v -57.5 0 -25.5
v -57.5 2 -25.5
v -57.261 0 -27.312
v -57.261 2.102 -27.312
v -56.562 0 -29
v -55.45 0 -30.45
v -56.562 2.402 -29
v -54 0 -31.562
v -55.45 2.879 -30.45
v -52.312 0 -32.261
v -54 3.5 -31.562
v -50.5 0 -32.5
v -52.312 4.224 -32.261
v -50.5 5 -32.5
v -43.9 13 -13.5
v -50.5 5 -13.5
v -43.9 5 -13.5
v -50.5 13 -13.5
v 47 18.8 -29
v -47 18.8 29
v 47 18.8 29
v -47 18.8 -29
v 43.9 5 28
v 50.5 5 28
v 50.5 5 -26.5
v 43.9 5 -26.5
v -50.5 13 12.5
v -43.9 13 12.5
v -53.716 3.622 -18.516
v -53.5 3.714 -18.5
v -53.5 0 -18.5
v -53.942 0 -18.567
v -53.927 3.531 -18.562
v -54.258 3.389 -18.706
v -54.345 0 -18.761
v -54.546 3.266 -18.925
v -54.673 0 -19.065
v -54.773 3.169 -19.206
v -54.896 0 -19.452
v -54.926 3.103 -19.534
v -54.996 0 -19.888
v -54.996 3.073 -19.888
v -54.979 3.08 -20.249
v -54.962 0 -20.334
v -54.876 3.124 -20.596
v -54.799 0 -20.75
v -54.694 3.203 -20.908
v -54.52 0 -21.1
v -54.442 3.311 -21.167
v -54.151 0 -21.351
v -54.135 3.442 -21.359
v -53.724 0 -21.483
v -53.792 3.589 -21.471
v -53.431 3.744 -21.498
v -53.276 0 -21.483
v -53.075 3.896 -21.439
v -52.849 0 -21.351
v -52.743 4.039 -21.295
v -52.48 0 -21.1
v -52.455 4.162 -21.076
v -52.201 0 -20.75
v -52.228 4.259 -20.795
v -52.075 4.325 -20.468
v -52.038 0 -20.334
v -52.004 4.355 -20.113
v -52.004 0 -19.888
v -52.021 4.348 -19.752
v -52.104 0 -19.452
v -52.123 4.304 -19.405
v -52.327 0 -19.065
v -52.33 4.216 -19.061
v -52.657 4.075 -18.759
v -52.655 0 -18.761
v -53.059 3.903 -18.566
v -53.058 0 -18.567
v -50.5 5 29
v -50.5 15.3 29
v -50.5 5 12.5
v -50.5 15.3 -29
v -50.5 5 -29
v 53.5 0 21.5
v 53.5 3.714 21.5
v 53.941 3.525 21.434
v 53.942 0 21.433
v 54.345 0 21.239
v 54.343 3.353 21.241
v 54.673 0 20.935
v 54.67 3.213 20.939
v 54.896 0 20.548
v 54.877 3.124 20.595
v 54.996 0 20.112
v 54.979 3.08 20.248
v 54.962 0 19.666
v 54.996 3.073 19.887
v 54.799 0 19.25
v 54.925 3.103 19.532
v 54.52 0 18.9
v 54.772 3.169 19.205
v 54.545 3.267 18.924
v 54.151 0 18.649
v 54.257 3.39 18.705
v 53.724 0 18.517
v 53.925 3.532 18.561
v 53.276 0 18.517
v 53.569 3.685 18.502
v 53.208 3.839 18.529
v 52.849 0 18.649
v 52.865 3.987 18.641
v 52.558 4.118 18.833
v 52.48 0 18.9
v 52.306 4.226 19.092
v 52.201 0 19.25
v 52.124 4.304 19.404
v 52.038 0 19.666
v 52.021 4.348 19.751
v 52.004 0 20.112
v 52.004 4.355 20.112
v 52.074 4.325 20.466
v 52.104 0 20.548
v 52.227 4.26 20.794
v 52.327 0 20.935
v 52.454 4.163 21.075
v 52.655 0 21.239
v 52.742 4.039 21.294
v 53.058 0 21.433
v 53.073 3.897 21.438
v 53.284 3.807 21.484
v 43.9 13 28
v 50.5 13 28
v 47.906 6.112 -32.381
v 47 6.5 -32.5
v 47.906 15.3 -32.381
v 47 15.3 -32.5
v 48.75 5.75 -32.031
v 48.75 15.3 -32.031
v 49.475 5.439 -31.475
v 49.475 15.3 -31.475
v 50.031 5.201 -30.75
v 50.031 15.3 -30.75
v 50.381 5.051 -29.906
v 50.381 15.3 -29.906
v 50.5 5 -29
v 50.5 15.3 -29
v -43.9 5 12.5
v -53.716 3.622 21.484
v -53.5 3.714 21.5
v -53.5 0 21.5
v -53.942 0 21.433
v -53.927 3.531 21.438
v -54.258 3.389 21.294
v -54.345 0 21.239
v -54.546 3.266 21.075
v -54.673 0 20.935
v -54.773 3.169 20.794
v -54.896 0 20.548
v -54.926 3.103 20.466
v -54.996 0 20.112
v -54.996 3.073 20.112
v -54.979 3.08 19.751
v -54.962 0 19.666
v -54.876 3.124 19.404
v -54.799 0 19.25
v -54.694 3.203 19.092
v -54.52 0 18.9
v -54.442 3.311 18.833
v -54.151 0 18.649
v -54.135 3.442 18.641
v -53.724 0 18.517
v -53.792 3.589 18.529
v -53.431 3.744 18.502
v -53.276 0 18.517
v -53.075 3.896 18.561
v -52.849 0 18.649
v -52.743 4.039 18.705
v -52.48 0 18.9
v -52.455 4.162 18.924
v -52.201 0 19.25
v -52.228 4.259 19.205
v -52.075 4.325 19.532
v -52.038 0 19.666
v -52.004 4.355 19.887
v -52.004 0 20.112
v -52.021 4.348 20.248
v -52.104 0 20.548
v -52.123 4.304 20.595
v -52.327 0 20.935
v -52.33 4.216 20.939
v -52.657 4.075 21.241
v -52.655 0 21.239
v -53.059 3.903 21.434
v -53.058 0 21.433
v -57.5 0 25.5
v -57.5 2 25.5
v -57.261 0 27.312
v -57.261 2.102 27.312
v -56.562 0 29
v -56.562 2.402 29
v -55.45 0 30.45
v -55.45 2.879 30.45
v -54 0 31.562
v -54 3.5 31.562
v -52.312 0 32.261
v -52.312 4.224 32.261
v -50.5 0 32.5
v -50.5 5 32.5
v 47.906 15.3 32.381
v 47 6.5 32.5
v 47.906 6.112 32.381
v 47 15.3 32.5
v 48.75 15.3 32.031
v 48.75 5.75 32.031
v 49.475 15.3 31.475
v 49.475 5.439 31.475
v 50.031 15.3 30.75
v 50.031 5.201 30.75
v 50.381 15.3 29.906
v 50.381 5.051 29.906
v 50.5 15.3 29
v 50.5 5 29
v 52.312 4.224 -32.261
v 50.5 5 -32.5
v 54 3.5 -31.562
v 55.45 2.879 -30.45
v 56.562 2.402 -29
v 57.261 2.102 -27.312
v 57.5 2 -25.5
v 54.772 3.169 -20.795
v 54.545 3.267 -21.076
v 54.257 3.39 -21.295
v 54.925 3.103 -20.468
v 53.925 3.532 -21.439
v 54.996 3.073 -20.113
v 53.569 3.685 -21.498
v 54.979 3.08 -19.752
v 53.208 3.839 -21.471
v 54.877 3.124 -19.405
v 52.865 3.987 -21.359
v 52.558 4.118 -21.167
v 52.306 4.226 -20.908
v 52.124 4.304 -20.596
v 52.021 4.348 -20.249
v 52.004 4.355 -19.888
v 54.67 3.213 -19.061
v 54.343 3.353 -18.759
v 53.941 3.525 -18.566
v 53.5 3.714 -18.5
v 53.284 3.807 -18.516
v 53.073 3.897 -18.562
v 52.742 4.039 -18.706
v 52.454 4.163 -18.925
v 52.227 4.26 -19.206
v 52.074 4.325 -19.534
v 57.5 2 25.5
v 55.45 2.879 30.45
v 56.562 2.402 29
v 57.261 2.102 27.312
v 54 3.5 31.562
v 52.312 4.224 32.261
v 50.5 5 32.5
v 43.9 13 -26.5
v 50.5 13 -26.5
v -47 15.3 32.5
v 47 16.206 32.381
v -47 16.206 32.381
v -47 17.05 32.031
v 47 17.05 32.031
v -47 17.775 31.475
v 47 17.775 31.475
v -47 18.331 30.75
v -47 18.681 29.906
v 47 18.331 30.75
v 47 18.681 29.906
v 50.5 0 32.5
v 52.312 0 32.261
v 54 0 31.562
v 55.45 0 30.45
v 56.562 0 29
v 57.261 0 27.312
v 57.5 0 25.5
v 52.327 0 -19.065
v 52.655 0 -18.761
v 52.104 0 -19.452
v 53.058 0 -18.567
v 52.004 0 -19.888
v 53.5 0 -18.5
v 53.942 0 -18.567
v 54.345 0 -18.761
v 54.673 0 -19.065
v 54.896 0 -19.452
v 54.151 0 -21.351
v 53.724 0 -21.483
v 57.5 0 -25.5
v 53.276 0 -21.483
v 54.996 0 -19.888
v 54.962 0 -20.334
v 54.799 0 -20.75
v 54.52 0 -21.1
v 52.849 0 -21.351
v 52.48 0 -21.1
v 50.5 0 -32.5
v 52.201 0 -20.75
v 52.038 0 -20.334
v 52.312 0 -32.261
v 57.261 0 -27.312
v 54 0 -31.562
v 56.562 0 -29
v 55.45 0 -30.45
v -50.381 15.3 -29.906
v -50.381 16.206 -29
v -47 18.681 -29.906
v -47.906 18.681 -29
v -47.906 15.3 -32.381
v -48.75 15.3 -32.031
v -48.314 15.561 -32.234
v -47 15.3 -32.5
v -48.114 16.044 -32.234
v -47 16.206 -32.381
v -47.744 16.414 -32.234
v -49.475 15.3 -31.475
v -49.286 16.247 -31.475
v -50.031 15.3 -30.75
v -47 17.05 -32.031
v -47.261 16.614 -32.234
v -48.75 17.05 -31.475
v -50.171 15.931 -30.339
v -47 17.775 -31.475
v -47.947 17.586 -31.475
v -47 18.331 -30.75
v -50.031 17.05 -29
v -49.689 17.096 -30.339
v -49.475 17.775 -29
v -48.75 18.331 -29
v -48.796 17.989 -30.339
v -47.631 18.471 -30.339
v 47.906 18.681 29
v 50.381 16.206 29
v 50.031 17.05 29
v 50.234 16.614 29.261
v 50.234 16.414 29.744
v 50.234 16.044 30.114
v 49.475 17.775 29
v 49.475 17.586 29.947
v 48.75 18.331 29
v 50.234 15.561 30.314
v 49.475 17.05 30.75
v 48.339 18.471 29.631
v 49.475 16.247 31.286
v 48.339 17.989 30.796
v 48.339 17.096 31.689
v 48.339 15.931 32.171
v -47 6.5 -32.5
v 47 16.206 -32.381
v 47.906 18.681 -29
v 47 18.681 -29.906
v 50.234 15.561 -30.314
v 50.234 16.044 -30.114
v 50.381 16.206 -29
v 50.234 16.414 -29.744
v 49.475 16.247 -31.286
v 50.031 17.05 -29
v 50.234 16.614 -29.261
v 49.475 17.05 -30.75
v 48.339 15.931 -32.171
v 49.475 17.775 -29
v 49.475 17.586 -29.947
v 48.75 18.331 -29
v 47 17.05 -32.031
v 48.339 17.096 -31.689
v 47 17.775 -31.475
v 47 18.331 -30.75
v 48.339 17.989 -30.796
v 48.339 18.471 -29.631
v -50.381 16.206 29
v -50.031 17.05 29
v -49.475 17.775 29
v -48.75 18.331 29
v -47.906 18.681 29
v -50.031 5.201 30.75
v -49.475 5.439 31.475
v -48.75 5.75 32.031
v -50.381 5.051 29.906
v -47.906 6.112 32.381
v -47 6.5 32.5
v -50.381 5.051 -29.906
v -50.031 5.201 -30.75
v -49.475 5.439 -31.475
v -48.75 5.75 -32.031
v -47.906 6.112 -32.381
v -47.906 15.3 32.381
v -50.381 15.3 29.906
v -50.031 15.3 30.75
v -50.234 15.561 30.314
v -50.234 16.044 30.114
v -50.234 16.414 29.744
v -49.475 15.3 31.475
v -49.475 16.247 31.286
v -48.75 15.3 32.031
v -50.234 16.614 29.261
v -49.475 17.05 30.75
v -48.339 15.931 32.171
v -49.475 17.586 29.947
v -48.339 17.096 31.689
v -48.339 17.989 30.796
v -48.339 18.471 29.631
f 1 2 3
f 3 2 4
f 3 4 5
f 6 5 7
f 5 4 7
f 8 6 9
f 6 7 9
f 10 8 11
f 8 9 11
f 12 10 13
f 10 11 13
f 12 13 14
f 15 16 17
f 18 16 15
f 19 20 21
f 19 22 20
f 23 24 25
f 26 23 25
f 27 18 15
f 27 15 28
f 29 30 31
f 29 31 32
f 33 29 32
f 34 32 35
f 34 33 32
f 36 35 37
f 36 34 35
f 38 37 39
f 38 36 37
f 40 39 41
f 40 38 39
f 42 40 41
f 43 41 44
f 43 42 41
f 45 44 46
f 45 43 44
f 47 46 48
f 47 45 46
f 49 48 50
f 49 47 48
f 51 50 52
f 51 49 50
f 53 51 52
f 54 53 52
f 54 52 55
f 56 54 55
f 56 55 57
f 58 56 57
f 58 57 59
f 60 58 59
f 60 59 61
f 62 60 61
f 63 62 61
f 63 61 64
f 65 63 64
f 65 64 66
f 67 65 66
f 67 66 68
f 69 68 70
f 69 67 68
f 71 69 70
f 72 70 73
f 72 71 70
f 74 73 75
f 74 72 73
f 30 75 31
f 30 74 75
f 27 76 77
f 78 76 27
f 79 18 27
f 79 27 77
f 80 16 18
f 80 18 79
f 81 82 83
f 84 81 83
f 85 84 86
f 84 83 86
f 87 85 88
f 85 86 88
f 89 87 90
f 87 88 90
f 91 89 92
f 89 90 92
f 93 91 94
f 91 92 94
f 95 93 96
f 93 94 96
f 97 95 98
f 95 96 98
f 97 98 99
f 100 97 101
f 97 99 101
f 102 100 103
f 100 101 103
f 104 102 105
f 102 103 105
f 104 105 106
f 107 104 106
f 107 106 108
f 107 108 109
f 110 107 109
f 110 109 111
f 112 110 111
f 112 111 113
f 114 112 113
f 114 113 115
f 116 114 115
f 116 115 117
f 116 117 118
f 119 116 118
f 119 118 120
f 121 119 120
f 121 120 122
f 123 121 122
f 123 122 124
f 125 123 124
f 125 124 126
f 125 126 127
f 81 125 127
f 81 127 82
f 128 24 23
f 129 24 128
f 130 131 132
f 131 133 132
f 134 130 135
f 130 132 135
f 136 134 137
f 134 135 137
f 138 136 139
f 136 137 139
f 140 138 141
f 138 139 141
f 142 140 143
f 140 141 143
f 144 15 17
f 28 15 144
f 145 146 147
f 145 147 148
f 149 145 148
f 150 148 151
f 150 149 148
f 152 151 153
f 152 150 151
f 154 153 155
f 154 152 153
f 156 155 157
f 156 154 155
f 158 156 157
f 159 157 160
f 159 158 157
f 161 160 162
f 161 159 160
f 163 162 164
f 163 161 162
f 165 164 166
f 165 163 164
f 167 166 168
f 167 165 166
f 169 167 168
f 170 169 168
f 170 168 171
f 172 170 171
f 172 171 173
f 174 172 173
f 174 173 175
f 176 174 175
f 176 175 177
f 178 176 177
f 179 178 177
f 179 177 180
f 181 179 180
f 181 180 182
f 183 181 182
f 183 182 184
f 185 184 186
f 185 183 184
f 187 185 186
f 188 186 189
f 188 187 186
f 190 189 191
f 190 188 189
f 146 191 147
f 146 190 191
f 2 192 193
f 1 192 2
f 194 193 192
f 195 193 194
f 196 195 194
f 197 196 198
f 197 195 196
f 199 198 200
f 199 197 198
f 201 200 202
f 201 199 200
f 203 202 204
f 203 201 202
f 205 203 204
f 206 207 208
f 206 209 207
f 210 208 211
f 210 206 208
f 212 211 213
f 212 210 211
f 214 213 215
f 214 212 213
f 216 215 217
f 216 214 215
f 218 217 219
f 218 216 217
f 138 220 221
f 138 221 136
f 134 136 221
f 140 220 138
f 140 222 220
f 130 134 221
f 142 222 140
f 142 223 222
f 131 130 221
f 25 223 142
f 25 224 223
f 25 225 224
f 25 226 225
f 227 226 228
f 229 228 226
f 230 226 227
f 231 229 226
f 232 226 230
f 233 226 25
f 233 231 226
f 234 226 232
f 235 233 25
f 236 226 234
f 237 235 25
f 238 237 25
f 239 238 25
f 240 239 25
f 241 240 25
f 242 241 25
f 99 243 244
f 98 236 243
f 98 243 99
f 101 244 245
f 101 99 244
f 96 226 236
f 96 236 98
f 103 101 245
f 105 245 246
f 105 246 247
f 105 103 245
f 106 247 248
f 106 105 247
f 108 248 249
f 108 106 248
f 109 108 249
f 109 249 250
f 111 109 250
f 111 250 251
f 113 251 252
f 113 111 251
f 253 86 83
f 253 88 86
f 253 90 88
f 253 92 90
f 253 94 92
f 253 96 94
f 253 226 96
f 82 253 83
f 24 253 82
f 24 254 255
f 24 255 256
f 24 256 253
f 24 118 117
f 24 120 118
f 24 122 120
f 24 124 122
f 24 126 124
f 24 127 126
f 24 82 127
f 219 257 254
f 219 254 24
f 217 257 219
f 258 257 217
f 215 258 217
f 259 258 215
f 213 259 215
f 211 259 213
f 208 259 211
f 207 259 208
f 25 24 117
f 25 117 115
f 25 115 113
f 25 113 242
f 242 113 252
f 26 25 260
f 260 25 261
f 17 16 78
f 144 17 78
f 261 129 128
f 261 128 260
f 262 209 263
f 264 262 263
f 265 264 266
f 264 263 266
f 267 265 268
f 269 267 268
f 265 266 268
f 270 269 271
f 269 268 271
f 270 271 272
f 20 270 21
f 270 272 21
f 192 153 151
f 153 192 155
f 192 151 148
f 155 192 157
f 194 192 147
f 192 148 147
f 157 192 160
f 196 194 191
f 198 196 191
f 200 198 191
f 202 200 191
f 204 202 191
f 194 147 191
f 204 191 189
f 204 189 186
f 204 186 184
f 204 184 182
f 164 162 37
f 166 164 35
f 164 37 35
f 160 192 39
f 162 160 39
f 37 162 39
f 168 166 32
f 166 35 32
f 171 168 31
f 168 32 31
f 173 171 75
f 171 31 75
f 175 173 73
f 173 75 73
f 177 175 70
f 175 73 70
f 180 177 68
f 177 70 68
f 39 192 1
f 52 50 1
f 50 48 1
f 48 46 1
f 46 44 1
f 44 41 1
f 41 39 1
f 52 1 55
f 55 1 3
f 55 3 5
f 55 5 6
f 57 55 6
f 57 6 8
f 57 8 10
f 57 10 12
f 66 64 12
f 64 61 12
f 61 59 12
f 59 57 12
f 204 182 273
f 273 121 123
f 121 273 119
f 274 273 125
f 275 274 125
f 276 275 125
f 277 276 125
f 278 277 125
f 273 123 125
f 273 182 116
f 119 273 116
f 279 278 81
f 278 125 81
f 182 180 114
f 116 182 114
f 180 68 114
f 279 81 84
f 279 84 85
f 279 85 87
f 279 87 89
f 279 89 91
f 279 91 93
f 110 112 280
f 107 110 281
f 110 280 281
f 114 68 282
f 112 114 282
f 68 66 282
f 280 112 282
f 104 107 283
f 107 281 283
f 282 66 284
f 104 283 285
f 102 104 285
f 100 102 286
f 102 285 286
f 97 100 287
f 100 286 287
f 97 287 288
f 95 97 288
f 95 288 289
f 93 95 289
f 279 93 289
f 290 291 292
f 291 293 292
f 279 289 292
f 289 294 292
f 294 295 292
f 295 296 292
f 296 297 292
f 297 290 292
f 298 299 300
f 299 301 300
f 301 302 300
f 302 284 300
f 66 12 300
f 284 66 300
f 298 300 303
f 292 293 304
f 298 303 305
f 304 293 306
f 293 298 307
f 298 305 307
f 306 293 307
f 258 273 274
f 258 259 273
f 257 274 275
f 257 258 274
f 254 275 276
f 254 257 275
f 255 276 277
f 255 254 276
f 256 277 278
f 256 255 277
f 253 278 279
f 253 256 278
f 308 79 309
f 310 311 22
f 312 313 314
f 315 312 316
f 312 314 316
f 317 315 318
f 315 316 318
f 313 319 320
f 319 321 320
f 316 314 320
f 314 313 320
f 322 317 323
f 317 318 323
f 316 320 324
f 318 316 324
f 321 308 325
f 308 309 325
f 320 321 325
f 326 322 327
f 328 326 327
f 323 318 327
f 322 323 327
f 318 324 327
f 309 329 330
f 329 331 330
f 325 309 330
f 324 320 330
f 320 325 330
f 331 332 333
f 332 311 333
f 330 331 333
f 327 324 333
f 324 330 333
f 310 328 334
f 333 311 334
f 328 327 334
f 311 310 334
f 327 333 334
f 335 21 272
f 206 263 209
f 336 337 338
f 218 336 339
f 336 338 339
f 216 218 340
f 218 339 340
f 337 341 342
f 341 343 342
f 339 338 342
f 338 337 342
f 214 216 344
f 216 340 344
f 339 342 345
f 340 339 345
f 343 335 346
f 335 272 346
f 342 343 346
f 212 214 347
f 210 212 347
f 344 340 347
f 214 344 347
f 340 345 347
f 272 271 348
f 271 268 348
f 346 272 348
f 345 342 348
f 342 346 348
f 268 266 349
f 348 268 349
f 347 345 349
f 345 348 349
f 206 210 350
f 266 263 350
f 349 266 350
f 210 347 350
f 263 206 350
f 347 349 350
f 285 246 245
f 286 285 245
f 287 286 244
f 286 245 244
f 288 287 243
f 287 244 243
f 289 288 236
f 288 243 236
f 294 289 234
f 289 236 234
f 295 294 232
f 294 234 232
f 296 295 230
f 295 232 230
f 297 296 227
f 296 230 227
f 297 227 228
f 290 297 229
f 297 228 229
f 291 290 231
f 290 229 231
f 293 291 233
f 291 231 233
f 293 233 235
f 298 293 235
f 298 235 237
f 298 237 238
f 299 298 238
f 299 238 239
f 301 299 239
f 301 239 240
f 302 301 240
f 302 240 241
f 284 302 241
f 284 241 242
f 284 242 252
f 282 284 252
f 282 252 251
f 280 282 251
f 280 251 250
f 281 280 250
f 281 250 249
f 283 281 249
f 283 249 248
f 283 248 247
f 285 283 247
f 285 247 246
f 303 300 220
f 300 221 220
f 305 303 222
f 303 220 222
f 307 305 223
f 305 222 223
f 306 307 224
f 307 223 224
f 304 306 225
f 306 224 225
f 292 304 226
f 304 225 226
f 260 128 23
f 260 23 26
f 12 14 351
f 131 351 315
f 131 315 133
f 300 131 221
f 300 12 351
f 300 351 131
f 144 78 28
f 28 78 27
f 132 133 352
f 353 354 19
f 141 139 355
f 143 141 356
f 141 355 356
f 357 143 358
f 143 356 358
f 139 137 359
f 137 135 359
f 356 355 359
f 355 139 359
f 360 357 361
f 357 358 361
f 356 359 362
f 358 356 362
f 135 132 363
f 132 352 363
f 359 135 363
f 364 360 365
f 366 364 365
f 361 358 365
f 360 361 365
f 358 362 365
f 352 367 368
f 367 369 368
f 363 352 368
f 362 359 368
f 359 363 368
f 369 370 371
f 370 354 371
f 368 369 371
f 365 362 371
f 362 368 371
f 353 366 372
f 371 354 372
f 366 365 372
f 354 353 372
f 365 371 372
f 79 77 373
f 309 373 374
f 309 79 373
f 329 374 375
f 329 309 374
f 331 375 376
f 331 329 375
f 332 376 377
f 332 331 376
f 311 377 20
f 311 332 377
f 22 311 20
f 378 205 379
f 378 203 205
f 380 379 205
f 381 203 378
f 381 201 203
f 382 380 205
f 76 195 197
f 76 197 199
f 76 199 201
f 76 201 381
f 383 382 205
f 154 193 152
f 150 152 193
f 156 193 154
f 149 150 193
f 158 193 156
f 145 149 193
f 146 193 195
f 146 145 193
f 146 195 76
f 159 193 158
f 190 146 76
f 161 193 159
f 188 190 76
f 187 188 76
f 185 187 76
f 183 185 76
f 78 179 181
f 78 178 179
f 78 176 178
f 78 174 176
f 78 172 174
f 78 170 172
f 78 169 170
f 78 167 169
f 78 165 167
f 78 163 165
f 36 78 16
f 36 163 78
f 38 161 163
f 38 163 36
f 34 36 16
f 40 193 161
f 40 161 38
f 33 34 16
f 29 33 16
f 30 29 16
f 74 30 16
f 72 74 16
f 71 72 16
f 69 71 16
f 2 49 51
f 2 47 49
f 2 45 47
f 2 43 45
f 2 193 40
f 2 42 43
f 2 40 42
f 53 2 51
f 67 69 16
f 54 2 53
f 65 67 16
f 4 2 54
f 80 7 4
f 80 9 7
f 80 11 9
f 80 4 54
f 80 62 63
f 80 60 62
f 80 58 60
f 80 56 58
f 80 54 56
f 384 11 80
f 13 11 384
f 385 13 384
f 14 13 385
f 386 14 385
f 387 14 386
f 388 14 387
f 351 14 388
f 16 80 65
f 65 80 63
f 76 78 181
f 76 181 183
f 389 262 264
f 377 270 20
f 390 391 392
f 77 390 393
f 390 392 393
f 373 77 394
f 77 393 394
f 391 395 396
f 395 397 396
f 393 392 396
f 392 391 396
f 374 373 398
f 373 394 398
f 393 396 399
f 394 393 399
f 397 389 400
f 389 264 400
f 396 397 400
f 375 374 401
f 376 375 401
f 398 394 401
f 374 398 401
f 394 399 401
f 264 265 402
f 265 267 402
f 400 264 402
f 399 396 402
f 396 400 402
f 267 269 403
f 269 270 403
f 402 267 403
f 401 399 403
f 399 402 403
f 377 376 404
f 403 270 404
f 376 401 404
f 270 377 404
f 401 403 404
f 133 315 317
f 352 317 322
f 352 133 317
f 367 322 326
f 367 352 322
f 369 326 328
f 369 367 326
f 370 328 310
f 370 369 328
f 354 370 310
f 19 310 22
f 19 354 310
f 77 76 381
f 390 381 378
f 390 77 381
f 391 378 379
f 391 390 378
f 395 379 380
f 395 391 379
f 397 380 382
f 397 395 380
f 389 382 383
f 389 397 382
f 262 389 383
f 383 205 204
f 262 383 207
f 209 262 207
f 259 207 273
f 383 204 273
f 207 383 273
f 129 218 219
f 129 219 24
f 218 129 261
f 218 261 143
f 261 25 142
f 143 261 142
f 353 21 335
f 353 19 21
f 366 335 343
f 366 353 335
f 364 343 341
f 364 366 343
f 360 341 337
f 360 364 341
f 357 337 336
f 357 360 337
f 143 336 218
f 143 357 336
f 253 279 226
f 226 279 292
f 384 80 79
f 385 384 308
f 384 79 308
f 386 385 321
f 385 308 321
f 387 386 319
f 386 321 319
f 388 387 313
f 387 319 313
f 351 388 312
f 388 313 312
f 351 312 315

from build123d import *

# Parameters (mm, degrees)
SKETCH1_W           = 115
SKETCH1_H           = 65
BOSS_EXTRUDE1_DEPTH = 5
SKETCH2_R           = 1.5
CUT_EXTRUDE1_DEPTH  = 67.238206497
CHAMFER1_SIZE       = 3
CHAMFER1_SIZE_2     = 7
FILLET1_R           = 7
SKETCH3_W           = 101
SKETCH3_H           = 65
BOSS_EXTRUDE2_DEPTH = 13.8
FILLET2_R           = 3.5
SKETCH4_W           = 26
SKETCH4_H           = 8
CUT_EXTRUDE2_DEPTH  = 6.6
SKETCH5_W           = 54.5
SKETCH5_H           = 8
CUT_EXTRUDE3_DEPTH  = 6.6


# Some blends are built 0.0001 mm under size
with BuildPart() as part:
    # Sketch1 → Boss-Extrude1 (new body)
    with BuildSketch(Plane(origin=(0, 0, 0), x_dir=(1, 0, 0), z_dir=(0, 1, 0))):
        Rectangle(SKETCH1_W, SKETCH1_H)
    extrude(amount=BOSS_EXTRUDE1_DEPTH)

    # Sketch2 → Cut-Extrude1 (cut, through all)
    with BuildSketch(Plane(origin=(0, 5, 0), x_dir=(1, 0, 0), z_dir=(0, 1, 0))):
        with Locations(Location((53.5, 20, 0), (0, 0, 270))):
            Circle(SKETCH2_R)
        with Locations(Location((53.5, -20, 0), (0, 0, 270))):
            Circle(SKETCH2_R)
    cut_extrude1 = extrude(amount=-CUT_EXTRUDE1_DEPTH, mode=Mode.SUBTRACT)

    # Mirror16: Cut-Extrude1 across plane
    add(cut_extrude1.mirror(Plane(origin=(0, 0, 0), x_dir=(0, 0, 1), z_dir=(1, 0, 0))), mode=Mode.SUBTRACT)

    # Chamfer1
    # the kernel refuses this chamfer: 7, 3 mm, written as the material it takes off along each edge
    with BuildSketch(Plane(origin=(-57.5, 5, -50.645496776), x_dir=(-0.08246287738523231, -0.9965941369752023, 0), z_dir=(0, 0, 1)), Plane(origin=(57.5, 5, 50.645496776), x_dir=(0.08246287738523231, -0.9965941369752023, 0), z_dir=(0, 0, -1))) as chamfer1_piece_1:
        Polygon((CHAMFER1_SIZE * 0.996594136975, CHAMFER1_SIZE * 0.0824628773852), (-CHAMFER1_SIZE_2 * 0.0824628773852, CHAMFER1_SIZE_2 * 0.996594136975), (0, 0), align=None)
    extrude(amount=101.290993551, mode=Mode.SUBTRACT)

    # Fillet1
    fillet1_edges = [part.edges().sort_by_distance(p)[0] for p in [
        (57.5, 1, -32.5),
        (57.5, 1, 32.5),
        (-57.5, 1, -32.5),
        (-57.5, 1, 32.5),
    ]]
    fillet(fillet1_edges, radius=FILLET1_R - 0.0001)  # a hair under: the kernel refuses the full size

    # Sketch3 → Boss-Extrude2 (add)
    with BuildSketch(Plane(origin=(0, 5, 0), x_dir=(1, 0, 0), z_dir=(0, 1, 0))):
        Rectangle(SKETCH3_W, SKETCH3_H)
    extrude(amount=BOSS_EXTRUDE2_DEPTH)

    # Fillet2
    fillet2_edges = [part.edges().sort_by_distance(p)[0] for p in [
        (0, 18.8, 32.5),
        (-50.5, 11.9, 32.5),
        (-50.5, 18.8, 0),
        (-50.5, 11.9, -32.5),
        (0, 18.8, -32.5),
        (50.5, 11.9, -32.5),
        (50.5, 18.8, 0),
        (50.5, 11.9, 32.5),
    ]]
    fillet(fillet2_edges, radius=FILLET2_R)

    # Sketch4 → Cut-Extrude2 (cut)
    with BuildSketch(Plane.ZY.offset(50.5)):
        with Locations((-0.5, 9)):
            Rectangle(SKETCH4_W, SKETCH4_H)
    extrude(amount=-CUT_EXTRUDE2_DEPTH, mode=Mode.SUBTRACT)

    # Sketch5 → Cut-Extrude3 (cut)
    with BuildSketch(Plane(origin=(50.5, 0, 0), x_dir=(0, 0, -1), z_dir=(1, 0, 0))):
        with Locations((-0.75, 9)):
            Rectangle(SKETCH5_W, SKETCH5_H)
    extrude(amount=-CUT_EXTRUDE3_DEPTH, mode=Mode.SUBTRACT)


solid = part.part
